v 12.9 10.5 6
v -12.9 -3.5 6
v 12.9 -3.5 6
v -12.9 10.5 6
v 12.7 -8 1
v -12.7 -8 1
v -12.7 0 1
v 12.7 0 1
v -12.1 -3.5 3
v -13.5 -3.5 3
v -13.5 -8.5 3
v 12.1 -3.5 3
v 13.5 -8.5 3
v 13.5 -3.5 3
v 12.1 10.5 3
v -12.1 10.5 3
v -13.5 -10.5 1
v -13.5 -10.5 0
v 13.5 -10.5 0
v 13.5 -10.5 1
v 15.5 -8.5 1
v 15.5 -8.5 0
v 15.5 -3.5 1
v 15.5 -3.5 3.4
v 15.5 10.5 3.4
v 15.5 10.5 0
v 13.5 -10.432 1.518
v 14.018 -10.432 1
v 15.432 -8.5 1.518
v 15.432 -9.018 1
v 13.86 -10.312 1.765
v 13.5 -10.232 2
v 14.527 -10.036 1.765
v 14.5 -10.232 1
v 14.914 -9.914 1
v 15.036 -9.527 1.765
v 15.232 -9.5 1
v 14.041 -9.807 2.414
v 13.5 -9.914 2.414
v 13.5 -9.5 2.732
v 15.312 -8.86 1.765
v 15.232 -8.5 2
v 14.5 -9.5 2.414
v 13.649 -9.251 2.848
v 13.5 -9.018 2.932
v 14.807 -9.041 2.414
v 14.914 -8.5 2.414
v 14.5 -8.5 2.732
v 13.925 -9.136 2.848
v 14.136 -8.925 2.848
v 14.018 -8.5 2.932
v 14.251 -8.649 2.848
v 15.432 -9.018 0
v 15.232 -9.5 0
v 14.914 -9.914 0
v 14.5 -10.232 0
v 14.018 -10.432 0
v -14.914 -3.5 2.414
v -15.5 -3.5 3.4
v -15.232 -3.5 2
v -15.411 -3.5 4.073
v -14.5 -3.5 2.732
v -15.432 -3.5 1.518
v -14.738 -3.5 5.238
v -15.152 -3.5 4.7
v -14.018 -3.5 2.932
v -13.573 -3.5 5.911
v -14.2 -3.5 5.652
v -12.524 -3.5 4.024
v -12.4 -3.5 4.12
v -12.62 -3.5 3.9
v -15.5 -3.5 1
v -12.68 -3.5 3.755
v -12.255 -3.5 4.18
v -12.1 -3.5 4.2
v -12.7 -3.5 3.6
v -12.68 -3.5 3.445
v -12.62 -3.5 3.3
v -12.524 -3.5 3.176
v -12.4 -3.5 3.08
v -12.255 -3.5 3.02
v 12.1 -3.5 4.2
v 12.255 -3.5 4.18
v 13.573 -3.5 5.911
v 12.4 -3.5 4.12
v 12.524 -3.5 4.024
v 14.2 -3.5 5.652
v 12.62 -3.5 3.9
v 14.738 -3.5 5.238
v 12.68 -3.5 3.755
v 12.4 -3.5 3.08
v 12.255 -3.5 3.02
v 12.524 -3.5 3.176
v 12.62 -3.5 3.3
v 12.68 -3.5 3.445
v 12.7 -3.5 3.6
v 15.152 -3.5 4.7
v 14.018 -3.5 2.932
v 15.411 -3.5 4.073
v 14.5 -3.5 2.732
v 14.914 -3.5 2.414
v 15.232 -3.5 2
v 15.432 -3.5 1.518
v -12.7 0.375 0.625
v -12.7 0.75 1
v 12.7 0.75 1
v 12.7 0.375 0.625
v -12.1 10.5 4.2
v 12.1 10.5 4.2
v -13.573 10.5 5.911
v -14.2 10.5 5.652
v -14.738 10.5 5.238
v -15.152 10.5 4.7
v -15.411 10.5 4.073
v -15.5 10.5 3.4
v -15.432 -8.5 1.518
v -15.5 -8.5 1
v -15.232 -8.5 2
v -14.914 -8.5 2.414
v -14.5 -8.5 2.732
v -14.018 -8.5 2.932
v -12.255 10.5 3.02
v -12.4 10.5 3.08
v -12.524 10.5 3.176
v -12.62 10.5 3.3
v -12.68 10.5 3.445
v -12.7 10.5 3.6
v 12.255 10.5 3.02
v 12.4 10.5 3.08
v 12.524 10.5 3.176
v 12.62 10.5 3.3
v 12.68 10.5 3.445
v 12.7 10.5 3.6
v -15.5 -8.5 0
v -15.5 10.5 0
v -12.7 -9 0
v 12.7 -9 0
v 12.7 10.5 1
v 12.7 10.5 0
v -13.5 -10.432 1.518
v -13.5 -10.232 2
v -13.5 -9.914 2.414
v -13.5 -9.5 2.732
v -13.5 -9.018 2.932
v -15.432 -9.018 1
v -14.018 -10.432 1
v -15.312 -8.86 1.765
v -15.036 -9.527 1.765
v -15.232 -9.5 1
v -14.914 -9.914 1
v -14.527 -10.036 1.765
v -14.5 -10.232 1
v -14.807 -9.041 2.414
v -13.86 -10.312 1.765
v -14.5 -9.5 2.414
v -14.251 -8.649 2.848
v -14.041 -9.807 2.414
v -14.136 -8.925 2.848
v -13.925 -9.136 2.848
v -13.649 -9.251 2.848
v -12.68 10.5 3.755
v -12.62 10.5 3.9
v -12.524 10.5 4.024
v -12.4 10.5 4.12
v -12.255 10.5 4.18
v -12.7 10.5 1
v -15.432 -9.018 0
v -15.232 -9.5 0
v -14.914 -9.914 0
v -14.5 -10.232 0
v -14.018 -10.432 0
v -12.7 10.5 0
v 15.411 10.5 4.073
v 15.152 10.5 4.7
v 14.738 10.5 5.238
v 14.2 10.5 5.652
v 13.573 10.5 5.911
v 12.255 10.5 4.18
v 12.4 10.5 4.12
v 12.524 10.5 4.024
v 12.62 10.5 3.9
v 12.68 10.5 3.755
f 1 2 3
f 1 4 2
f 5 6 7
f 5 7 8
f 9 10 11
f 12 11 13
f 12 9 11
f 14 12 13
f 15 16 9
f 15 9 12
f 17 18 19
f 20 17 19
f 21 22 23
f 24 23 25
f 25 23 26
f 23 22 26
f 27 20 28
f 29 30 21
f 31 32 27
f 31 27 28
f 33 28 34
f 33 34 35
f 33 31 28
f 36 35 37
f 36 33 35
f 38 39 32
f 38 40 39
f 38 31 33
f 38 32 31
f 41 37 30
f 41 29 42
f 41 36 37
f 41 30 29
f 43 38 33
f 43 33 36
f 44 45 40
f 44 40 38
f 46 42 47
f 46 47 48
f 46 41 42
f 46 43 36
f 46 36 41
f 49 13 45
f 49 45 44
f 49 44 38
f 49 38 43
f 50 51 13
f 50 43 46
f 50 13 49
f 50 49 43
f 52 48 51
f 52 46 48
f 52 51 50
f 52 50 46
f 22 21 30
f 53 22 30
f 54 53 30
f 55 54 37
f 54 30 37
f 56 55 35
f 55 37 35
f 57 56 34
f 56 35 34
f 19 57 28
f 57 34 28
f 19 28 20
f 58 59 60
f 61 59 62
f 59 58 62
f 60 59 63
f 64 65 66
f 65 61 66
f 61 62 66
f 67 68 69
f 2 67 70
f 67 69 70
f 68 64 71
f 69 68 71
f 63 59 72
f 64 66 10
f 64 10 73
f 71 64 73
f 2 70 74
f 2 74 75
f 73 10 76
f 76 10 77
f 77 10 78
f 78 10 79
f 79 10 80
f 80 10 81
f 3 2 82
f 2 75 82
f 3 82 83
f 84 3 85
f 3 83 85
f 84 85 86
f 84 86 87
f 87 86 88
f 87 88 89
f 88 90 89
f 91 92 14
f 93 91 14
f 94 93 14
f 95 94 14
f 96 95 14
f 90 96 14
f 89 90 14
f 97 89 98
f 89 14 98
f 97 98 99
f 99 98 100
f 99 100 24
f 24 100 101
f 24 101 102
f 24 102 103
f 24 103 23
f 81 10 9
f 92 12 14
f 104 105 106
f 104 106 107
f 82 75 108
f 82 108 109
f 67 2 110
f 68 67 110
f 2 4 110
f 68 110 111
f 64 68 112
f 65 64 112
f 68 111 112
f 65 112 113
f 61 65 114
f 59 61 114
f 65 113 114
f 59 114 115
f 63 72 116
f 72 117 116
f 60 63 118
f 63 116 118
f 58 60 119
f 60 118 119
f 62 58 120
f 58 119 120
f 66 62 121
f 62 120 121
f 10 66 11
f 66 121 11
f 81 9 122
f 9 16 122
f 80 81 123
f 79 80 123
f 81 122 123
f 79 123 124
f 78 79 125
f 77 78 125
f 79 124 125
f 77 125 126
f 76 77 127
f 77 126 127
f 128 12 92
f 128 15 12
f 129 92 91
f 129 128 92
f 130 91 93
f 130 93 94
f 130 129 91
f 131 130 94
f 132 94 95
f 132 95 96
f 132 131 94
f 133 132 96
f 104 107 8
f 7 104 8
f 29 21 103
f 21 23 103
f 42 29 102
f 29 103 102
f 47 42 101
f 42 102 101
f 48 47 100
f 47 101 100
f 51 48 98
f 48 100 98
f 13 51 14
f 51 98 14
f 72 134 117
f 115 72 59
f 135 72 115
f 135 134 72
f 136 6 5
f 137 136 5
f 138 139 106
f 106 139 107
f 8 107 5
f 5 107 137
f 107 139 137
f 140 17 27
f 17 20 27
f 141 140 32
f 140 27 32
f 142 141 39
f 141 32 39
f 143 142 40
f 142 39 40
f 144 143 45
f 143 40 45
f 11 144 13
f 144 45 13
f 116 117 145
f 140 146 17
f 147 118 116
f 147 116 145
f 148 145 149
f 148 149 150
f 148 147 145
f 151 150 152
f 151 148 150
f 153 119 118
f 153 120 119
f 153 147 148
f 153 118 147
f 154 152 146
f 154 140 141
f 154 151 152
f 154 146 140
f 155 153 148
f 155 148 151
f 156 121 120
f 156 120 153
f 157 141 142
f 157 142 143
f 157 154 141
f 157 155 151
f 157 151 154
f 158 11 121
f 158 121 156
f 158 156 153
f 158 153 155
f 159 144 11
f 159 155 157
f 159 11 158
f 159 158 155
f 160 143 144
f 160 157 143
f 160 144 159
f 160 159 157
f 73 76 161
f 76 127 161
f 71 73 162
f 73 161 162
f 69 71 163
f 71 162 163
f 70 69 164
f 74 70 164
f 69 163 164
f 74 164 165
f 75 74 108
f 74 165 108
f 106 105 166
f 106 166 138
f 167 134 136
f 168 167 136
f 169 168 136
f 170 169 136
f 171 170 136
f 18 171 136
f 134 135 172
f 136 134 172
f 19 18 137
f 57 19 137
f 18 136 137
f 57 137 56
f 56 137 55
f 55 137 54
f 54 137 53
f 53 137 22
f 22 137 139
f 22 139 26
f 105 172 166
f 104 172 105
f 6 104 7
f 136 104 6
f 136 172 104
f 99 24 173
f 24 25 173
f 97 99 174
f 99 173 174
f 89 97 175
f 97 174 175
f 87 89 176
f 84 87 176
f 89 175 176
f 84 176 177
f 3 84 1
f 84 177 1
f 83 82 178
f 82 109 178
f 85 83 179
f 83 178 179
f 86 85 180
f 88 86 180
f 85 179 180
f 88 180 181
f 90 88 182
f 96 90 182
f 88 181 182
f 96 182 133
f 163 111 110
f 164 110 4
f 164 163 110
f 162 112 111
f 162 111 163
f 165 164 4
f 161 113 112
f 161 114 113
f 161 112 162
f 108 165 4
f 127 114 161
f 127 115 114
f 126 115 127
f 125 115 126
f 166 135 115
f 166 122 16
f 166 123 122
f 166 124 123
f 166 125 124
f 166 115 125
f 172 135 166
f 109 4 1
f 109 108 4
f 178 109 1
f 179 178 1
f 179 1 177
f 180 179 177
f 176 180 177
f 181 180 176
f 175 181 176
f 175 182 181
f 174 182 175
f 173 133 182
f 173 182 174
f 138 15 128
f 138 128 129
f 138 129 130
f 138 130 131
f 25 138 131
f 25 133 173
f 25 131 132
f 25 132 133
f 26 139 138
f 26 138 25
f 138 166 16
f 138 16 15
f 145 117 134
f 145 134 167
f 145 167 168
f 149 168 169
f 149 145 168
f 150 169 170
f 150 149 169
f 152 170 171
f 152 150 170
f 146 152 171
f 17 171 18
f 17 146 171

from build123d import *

# Parameters (mm, degrees)
F0_W         = 31
F0_H         = 21
F1_DEPTH     = 3
F2_W         = 31
F2_H         = 14
F3_DEPTH     = 3
F4_W         = 25.4
F4_H         = 1.2
F5_DEPTH     = 25
F6_W         = 25.4
F6_H         = 19.5
F7_DEPTH     = 1
F8_R         = 0.59999
F9_R         = 2.6
F10_W        = 25.4
F10_H        = 0.75
F11_DEPTH    = 0.5
F12_T4_DEPTH = 25.4
F12_T9_DEPTH = 25.4
F13_R        = 2
F14_SIZE     = 0.99999
F15_R        = 2


# Not quite as in the source:
# - a fillet or chamfer that OpenCascade refuses, or shapes differently, is made with other operations: its cross-section is extruded or revolved along the edge and cut away or added
# - a fillet or chamfer is up to 0.001 mm smaller than in the source, because OpenCascade refuses the exact size


with BuildPart() as f1:
    # F0 (on Top) → F1 (new body)
    with BuildSketch(Plane.XY):
        Rectangle(F0_W, F0_H)
    extrude(amount=F1_DEPTH)

    # F2 (on face) → F3 (join)
    with BuildSketch(Plane.XY.offset(3)):
        with Locations((0, 3.5)):
            Rectangle(F2_W, F2_H)
    extrude(amount=F3_DEPTH)

    # F4 (on face) → F5 (cut)
    with BuildSketch(Plane.XZ.offset(3.5)):
        with Locations((0, 3.6)):
            Rectangle(F4_W, F4_H)
    extrude(amount=-F5_DEPTH, mode=Mode.SUBTRACT)

    # F6 (on face) → F7 (cut)
    with BuildSketch(Plane(origin=(0, 0, 0), x_dir=(1, 0, 0), z_dir=(0, 0, -1))):
        with Locations((0, -0.75)):
            Rectangle(F6_W, F6_H)
    extrude(amount=-F7_DEPTH, mode=Mode.SUBTRACT)

    # F8 (radius 0.6 in the source; OpenCascade refuses exactly that, so slightly less here)
    f8_edges = [f1.edges().sort_by_distance(p)[0] for p in [
        (12.7, 3.5, 4.2),
        (12.7, 3.5, 3),
        (-12.7, 3.5, 3),
        (-12.7, 3.5, 4.2),
    ]]
    fillet(f8_edges, radius=F8_R)

    # F9
    f9_edges = [f1.edges().sort_by_distance(p)[0] for p in [
        (-15.5, 3.5, 6),
        (15.5, 3.5, 6),
    ]]
    fillet(f9_edges, radius=F9_R)

    # F10 (on face) → F11 (join)
    with BuildSketch(Plane(origin=(0, 0, 1), x_dir=(1, 0, 0), z_dir=(0, 0, -1))):
        with Locations((0, -0.375)):
            Rectangle(F10_W, F10_H)
    extrude(amount=F11_DEPTH)

    # F12: chamfer of 0.5 on 2 edges, made by hand


with BuildPart() as f12_tool2:
    # F12_s3 → F12_t4 (new body)
    with BuildSketch(Plane.YZ.offset(12.7)):
        Polygon((0.5, 0.5), (0, 1), (0, 0.5), align=None)
    extrude(amount=-F12_T4_DEPTH)

    split(bisect_by=Plane.XY.offset(1), keep=Keep.BOTTOM)


with BuildPart() as f1_1:
    add(f1.part)

    # F12_t1: cut F12_tool2
    add(f12_tool2.part, mode=Mode.SUBTRACT)


with BuildPart() as f12_tool7:
    # F12_s8 → F12_t9 (new body)
    with BuildSketch(Plane.YZ.offset(-12.7)):
        Polygon((0.75, 1), (0.25, 0.5), (0.75, 0.5), align=None)
    extrude(amount=F12_T9_DEPTH)

    split(bisect_by=Plane.XY.offset(1), keep=Keep.BOTTOM)


with BuildPart() as f1_2:
    add(f1_1.part)

    # F12_t6: cut F12_tool7
    add(f12_tool7.part, mode=Mode.SUBTRACT)

    # F13
    f13_edges = [f1_2.edges().sort_by_distance(p)[0] for p in [
        (15.5, -10.5, 1.5),
        (-15.5, -10.5, 1.5),
    ]]
    fillet(f13_edges, radius=F13_R)

    # F14 (size 1 in the source; OpenCascade refuses exactly that, so slightly less here)
    f14_edges = [f1_2.edges().sort_by_distance(p)[0] for p in [
        (0, -9, 1),
    ]]
    chamfer(f14_edges, length=F14_SIZE)

    # F15
    f15_edges = [f1_2.edges().sort_by_distance(p)[0] for p in [
        (0, -10.5, 3),
    ]]
    fillet(f15_edges, radius=F15_R)


solid = f1_2.part
